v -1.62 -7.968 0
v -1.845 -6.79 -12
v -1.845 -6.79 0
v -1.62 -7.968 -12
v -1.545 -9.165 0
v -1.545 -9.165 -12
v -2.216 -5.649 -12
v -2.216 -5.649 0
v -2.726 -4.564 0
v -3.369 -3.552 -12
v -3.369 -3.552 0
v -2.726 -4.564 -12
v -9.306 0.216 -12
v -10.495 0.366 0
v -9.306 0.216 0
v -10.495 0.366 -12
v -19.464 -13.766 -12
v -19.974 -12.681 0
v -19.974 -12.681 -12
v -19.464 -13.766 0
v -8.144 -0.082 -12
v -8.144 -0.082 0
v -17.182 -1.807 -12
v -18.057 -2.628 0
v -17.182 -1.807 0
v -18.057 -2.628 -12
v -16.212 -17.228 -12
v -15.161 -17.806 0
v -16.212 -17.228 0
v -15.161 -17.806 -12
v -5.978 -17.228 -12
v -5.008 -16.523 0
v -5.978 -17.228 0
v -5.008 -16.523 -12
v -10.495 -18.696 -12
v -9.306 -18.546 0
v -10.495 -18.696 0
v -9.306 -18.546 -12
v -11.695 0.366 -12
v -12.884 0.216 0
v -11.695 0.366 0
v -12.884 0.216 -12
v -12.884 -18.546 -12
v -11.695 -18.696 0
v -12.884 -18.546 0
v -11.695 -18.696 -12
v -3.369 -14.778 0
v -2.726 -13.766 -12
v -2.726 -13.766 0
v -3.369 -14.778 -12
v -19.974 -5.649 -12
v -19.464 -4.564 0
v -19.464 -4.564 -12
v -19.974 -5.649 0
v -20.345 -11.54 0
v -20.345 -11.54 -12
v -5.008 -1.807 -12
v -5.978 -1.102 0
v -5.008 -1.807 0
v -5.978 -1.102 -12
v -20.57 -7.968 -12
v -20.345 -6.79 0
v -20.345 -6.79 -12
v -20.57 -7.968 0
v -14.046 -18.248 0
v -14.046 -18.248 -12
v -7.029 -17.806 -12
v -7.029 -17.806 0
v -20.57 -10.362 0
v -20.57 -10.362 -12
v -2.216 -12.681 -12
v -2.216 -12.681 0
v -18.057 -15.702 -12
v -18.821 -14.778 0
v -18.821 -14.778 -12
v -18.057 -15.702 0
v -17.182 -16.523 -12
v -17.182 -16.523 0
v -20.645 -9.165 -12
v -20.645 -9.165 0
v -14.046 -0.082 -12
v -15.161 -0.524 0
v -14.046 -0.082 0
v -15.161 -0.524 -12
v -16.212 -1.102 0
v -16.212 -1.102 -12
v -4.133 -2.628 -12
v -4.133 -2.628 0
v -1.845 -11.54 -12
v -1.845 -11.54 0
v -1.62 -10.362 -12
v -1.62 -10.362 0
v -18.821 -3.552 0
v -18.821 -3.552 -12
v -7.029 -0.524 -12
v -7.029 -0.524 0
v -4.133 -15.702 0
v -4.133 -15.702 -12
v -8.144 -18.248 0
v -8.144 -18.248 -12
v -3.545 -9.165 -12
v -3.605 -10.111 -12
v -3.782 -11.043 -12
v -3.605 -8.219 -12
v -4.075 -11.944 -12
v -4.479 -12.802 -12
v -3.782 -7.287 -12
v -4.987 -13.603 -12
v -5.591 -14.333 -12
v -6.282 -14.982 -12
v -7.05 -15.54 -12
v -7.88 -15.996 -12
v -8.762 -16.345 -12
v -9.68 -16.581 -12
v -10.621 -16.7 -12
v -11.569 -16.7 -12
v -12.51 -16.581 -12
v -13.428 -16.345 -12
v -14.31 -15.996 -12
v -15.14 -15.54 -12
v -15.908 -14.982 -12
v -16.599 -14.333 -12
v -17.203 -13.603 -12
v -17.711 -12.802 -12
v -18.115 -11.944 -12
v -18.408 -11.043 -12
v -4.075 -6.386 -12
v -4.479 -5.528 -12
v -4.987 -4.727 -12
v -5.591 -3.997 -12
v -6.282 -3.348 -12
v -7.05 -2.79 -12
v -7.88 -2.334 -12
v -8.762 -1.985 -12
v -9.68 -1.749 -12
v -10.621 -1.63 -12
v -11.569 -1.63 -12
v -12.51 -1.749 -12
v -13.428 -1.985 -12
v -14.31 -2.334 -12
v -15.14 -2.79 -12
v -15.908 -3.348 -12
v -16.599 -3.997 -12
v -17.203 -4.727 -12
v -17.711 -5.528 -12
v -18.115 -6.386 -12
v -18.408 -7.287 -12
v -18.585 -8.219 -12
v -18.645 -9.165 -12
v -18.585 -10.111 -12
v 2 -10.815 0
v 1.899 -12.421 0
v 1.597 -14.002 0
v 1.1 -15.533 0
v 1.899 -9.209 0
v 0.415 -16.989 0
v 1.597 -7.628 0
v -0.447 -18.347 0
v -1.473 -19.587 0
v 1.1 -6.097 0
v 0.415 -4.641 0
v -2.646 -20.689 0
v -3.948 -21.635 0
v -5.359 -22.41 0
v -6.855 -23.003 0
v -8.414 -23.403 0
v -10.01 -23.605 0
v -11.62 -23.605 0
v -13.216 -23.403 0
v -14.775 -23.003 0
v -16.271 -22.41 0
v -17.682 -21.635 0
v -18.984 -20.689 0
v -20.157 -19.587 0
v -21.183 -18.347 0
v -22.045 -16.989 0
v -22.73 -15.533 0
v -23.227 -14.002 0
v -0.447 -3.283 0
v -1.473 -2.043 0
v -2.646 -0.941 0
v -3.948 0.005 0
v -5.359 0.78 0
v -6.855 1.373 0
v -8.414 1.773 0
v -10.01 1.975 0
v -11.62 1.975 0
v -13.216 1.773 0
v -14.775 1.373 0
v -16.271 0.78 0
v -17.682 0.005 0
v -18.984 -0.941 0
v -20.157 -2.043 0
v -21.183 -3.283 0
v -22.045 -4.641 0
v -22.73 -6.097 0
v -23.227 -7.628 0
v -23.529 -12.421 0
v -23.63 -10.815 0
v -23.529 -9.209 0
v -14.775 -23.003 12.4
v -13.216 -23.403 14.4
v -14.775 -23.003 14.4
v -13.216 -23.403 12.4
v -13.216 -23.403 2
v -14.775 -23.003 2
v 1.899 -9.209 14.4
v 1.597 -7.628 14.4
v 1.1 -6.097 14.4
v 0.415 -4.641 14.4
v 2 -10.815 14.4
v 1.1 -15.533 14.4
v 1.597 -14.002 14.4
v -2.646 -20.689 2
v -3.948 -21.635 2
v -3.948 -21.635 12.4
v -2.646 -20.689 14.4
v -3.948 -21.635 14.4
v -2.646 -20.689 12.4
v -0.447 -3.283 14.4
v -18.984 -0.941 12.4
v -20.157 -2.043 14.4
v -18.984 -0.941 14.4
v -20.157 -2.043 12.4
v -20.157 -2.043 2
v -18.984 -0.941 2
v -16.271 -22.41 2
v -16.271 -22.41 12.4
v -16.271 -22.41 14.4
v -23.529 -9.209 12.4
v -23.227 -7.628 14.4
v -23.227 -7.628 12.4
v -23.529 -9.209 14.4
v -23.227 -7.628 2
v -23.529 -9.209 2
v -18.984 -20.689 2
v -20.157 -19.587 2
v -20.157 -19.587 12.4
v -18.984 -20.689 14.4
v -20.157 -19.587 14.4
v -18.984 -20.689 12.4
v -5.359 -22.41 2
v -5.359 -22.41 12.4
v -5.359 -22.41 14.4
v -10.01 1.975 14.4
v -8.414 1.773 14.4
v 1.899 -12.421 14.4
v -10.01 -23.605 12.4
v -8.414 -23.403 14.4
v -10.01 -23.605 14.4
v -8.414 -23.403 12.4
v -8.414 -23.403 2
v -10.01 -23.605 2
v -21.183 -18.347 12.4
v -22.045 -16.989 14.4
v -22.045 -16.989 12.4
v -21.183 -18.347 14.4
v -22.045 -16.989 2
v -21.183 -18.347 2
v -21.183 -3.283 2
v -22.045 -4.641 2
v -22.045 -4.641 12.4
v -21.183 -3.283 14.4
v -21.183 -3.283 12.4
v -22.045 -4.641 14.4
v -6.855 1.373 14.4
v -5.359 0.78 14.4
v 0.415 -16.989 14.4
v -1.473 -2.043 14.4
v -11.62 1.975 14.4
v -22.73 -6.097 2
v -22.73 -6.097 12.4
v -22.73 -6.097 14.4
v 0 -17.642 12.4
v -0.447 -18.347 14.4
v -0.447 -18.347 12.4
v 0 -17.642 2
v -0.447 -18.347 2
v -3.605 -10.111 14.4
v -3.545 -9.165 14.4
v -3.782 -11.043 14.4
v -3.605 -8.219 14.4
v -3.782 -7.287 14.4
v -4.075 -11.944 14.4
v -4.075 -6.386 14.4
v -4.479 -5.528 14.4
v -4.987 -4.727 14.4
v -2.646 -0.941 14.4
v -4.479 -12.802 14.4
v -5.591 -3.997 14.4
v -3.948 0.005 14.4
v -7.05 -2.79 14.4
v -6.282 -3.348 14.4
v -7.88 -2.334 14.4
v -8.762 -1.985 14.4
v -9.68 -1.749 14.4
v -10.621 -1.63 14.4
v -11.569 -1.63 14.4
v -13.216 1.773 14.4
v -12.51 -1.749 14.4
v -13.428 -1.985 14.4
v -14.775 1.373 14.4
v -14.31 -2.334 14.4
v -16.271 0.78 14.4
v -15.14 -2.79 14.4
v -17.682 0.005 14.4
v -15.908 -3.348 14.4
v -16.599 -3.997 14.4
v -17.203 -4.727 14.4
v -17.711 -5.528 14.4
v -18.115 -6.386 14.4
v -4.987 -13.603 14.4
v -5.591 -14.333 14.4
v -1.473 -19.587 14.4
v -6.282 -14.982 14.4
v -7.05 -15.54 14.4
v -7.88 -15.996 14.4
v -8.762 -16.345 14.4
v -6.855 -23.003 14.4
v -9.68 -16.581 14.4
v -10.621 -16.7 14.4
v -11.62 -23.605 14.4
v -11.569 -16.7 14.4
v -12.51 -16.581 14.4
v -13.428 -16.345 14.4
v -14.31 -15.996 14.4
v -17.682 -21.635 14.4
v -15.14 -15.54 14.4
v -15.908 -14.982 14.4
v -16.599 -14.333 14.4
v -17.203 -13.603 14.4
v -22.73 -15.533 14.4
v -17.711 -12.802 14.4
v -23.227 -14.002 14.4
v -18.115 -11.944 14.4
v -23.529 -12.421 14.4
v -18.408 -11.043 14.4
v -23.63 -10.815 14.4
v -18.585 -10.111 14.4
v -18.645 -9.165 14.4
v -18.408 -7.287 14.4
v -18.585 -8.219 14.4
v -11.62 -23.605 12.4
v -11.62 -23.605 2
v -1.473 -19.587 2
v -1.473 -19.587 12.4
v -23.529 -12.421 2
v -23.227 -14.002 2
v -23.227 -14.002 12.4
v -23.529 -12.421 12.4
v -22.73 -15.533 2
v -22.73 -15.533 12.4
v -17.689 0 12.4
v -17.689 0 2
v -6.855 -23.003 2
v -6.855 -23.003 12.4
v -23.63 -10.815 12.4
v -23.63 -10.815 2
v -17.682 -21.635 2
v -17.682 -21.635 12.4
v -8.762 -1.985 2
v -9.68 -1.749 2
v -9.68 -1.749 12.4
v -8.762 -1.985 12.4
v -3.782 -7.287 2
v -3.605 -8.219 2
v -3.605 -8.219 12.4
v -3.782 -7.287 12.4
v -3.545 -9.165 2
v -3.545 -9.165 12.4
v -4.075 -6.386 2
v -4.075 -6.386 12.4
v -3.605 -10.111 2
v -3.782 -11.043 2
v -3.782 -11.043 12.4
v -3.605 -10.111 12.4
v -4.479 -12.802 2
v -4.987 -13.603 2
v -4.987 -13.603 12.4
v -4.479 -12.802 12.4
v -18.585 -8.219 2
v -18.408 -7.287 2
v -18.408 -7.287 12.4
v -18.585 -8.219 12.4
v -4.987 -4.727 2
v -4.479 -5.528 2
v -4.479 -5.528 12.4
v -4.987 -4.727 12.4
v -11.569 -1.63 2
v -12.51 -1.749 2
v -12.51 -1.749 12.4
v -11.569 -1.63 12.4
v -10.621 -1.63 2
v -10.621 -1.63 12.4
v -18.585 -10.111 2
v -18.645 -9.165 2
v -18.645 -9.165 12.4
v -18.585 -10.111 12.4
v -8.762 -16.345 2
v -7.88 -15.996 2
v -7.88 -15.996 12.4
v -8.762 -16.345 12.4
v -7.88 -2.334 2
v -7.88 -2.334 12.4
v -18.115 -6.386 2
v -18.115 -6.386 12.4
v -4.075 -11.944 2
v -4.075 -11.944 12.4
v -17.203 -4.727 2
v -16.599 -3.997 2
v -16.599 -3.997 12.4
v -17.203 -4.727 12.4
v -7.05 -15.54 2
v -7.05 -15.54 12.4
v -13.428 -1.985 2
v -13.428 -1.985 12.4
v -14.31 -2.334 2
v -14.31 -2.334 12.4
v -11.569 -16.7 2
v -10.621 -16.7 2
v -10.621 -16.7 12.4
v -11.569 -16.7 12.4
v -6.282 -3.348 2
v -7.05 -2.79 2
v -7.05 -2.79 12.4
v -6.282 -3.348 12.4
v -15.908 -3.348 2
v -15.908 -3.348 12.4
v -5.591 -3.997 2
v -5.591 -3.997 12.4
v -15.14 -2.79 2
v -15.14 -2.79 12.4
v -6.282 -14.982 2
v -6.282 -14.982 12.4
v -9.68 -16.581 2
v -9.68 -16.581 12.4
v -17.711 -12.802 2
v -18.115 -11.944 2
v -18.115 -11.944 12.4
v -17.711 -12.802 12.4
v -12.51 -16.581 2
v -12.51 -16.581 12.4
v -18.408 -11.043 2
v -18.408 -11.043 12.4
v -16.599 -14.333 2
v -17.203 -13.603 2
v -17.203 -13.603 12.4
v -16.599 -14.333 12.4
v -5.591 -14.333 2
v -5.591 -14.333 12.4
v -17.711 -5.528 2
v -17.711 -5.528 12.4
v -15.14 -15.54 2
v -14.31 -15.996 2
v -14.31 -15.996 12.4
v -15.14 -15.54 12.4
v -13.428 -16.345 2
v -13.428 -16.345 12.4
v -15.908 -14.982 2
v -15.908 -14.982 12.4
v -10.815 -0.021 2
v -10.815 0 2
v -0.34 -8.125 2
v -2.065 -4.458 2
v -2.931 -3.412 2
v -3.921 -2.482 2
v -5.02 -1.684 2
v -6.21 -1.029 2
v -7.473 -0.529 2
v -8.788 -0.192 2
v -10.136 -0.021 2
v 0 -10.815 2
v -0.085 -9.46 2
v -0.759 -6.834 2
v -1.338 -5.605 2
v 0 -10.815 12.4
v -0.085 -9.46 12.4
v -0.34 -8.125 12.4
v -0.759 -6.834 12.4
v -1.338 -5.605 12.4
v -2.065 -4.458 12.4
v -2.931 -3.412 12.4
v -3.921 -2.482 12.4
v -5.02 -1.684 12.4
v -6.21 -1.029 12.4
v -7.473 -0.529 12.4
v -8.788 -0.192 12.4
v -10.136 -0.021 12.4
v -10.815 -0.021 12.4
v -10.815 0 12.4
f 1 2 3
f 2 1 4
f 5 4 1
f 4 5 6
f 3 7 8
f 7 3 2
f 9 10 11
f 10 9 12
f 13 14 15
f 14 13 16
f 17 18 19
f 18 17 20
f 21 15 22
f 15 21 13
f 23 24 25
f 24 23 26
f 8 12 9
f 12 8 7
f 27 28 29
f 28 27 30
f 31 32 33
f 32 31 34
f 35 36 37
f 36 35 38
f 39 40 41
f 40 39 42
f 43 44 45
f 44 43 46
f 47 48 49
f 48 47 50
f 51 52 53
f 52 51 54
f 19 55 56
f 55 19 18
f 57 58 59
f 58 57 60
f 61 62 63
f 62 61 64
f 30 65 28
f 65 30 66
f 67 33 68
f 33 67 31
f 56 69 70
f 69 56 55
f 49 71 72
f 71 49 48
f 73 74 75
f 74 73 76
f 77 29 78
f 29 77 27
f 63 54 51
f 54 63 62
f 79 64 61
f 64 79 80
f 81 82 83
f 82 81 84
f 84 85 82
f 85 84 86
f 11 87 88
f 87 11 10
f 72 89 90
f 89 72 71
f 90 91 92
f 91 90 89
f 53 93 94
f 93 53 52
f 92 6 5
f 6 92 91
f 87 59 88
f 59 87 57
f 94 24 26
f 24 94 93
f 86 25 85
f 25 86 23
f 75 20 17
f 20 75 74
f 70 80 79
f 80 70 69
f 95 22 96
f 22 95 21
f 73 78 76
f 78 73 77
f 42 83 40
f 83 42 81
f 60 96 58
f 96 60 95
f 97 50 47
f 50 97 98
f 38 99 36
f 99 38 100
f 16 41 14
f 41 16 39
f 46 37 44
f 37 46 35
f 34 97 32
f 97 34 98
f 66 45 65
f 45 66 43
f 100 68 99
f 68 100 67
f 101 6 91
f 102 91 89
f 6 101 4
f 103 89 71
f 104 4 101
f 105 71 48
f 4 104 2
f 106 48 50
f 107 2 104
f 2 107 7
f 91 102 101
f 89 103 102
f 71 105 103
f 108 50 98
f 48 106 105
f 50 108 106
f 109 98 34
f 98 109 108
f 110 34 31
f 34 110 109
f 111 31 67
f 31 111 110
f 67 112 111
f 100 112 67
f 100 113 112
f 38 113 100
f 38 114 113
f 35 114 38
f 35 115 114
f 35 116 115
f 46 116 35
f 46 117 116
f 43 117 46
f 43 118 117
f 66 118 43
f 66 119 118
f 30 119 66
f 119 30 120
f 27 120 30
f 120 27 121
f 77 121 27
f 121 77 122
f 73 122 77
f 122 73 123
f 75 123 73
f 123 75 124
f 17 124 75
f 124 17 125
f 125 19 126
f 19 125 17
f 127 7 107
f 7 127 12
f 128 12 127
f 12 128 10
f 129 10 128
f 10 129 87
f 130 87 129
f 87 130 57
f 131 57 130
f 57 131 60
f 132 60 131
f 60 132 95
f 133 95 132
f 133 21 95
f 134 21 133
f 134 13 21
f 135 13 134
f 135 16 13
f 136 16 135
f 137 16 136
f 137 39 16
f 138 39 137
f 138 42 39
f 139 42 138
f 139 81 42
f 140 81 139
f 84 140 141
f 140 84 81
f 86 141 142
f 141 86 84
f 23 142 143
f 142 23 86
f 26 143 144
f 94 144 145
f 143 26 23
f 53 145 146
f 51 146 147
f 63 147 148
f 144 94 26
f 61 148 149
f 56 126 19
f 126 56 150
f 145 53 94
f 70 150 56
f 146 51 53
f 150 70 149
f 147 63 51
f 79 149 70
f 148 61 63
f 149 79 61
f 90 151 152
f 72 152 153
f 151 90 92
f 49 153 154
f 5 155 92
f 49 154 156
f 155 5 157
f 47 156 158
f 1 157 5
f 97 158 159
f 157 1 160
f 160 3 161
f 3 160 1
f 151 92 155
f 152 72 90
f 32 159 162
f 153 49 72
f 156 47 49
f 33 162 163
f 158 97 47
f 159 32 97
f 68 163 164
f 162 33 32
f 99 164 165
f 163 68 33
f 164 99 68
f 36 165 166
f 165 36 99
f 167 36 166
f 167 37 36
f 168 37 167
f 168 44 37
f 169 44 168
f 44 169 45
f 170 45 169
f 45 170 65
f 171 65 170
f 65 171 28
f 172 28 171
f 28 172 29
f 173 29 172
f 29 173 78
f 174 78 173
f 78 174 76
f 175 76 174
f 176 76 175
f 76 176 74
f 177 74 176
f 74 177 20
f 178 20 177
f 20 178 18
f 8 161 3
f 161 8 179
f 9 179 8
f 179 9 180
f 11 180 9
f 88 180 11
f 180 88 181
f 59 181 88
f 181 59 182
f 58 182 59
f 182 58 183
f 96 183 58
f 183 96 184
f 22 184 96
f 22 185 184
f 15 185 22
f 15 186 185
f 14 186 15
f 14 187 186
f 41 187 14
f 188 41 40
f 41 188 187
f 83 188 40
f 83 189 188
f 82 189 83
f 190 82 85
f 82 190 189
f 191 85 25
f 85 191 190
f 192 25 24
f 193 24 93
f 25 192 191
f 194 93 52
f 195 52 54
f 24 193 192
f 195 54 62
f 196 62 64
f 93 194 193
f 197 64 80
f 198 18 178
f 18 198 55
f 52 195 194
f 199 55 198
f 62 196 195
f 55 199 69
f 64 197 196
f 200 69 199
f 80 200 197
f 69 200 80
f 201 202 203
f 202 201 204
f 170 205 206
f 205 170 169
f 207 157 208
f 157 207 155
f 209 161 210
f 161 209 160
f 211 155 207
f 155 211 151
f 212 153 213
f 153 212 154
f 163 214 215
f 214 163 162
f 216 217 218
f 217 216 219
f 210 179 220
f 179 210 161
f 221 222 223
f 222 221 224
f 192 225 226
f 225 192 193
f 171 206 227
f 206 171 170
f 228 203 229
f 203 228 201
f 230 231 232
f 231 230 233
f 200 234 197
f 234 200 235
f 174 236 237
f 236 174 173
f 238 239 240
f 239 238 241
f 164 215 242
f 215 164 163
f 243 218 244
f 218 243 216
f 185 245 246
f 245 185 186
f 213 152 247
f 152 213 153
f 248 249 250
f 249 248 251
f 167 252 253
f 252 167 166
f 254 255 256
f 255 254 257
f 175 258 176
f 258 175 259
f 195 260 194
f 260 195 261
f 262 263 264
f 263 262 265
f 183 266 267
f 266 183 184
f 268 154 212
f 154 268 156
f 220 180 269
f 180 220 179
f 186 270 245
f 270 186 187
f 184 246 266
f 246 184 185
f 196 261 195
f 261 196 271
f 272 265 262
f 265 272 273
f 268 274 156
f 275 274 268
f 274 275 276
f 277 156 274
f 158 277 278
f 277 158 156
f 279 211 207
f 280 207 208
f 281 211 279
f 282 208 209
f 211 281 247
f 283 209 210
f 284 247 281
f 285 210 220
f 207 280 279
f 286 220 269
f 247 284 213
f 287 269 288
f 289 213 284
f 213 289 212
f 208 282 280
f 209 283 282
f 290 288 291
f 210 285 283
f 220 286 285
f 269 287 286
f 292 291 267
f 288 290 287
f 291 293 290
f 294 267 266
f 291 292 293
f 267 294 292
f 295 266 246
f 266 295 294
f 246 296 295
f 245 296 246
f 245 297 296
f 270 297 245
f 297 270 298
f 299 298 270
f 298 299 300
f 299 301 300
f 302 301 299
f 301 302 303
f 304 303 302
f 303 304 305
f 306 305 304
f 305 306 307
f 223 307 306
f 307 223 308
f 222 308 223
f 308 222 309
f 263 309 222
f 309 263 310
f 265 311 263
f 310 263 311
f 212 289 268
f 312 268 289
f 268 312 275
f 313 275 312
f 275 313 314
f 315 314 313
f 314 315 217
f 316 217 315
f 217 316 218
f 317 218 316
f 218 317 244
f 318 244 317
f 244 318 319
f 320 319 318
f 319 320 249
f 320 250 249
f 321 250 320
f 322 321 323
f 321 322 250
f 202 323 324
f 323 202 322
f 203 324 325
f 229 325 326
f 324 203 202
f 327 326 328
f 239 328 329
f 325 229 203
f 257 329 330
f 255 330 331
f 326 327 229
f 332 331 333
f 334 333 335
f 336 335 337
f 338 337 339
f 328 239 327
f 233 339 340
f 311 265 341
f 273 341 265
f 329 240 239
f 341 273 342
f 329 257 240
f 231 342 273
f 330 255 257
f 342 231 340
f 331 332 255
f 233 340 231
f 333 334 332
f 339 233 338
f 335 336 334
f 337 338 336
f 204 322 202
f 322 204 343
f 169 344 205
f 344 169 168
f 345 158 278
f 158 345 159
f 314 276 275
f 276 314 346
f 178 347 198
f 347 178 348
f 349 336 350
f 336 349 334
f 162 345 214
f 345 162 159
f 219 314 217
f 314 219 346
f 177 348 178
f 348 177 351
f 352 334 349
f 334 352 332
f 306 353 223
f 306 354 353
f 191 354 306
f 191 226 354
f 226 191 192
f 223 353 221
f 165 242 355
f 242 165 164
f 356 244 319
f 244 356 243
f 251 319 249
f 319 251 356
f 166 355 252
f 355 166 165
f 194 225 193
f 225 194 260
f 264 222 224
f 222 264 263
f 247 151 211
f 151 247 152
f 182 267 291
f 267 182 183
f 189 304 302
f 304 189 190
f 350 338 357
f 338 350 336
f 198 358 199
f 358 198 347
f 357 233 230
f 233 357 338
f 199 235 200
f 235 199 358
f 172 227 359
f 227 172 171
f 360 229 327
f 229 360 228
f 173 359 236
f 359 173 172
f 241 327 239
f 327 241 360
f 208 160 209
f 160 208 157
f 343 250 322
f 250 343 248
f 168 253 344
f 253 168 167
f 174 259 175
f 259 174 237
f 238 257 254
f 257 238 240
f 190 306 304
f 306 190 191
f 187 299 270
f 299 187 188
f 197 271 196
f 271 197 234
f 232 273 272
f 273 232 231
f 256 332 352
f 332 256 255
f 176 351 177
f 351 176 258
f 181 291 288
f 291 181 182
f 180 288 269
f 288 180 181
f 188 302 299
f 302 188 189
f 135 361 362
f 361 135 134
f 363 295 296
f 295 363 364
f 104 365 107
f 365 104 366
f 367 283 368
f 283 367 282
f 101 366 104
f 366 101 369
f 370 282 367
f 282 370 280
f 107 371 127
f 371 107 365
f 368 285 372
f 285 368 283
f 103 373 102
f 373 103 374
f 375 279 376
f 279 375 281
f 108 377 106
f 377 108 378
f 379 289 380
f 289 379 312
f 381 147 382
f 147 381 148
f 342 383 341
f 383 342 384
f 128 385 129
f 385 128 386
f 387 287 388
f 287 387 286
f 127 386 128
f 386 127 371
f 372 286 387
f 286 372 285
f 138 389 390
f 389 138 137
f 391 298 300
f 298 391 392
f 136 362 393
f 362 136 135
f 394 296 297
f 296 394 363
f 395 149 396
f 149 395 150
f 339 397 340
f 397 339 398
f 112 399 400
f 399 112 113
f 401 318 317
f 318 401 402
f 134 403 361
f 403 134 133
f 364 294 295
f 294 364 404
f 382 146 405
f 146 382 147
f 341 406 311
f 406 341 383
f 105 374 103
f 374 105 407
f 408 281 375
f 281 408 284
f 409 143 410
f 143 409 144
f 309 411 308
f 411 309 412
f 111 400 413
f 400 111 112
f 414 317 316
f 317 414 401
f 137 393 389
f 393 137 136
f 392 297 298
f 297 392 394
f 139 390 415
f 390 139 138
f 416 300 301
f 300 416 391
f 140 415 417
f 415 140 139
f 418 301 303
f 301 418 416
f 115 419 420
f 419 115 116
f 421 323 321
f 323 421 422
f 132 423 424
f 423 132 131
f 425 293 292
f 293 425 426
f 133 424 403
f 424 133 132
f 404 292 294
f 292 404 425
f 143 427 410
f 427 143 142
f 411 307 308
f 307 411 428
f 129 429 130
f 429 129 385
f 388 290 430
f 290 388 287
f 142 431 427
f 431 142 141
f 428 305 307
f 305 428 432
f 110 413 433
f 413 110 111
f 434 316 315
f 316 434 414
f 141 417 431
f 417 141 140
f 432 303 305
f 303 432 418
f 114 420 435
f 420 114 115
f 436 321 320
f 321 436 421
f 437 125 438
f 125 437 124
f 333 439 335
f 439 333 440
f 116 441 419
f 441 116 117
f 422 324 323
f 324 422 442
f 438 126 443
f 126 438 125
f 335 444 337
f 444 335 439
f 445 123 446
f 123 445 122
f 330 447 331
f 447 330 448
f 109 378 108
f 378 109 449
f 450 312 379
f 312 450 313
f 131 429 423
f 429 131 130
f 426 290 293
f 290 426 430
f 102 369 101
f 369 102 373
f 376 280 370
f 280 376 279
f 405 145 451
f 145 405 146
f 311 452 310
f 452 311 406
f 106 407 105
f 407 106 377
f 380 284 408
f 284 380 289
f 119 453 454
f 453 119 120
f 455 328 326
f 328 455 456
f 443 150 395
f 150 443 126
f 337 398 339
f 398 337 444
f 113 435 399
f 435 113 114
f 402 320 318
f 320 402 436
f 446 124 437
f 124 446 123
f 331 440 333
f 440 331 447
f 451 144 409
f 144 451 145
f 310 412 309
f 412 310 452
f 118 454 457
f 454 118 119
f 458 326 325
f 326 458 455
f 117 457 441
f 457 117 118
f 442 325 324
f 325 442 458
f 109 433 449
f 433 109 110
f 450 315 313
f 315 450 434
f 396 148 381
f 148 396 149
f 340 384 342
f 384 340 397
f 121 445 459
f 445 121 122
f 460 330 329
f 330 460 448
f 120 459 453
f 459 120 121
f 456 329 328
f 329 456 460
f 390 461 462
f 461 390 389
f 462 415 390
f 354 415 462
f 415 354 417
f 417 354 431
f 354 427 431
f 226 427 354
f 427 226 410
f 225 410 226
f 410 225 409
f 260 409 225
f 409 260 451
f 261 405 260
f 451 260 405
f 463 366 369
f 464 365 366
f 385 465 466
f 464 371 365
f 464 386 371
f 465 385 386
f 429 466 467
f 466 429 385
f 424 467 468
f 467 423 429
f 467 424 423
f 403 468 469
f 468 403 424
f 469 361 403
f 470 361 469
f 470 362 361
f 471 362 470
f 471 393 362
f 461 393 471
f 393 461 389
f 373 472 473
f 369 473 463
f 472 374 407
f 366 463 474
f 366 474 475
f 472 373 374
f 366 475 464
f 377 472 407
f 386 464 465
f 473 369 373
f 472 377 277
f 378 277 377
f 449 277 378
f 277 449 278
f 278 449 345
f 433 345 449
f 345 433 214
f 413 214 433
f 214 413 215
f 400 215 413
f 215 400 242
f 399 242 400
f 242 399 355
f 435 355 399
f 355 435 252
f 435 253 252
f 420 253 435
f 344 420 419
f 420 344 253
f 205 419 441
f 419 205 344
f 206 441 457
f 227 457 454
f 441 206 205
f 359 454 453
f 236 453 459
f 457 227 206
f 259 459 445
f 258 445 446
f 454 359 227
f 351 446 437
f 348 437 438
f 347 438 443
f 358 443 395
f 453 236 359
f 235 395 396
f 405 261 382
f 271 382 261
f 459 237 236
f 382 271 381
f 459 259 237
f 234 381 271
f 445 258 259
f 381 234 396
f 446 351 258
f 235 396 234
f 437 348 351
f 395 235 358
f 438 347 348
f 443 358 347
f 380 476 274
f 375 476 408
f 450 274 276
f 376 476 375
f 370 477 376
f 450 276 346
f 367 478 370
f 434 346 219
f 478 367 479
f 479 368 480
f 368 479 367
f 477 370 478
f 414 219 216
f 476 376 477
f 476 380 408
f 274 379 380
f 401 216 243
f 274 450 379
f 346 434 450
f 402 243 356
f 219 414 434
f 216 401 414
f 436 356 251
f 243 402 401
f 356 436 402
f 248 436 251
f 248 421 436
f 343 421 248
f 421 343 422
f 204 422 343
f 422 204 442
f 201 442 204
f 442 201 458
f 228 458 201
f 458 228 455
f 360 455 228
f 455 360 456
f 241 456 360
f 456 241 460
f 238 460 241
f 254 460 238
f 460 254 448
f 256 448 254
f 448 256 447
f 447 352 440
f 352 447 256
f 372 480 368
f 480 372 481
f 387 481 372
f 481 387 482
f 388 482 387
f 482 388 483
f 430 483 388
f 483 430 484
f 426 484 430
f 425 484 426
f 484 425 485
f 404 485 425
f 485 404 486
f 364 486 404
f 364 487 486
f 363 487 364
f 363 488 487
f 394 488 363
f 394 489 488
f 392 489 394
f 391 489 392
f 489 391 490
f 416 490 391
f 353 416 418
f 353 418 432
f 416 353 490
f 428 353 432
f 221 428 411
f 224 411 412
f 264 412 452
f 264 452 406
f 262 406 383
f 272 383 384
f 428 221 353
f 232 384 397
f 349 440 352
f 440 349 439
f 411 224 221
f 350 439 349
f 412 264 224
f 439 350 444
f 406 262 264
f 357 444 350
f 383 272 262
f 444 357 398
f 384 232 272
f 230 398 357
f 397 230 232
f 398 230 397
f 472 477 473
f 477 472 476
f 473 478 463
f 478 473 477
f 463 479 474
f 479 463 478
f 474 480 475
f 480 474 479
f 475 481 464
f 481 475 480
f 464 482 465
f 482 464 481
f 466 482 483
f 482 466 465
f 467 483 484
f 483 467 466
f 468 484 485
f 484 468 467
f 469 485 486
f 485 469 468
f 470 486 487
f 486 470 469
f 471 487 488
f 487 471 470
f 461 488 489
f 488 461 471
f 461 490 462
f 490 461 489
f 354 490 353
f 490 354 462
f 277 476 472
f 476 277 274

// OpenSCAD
wall_thickness = 2;

// Length of the tube holder.
lens_tube_length = 12;

// Radius of tube holder.
lens_tube_r = 15.1 / 2;

// Measured height of phone case, including fudge factor for fit.
case_height = 10.4;

// Measured width of the case, used to determine case thickness.
case_width = 62.2;

// Extra distance in the X axis to offset lens center. Positive moves lens left in image.
lens_offset_fudge_x = 0;

// Extra dystance in the Y axis to offset lens center. Positive moves lens down in image.
lens_offset_fudge_y = 0;

// From dimensional drawings for iPhone 5. You shouldn't have to change these next three, but you can if you need to.
iphone_width = 58.57;
iphone_lens_center_offset_x = 9.28;
iphone_lens_center_offset_y = 7.35;

// Guessed at. No precise numbers available.
iphone_corner_radius = 9;

// [None]
// Calculated dimensions
case_wall_thickness = (case_width - iphone_width) / 2;
case_lens_center_offset_x = iphone_lens_center_offset_x + case_wall_thickness + lens_offset_fudge_x;
case_lens_center_offset_y = iphone_lens_center_offset_y + case_wall_thickness + lens_offset_fudge_y;
case_corner_radius = iphone_corner_radius + case_wall_thickness;
full_tube_height = case_height + 2*wall_thickness + lens_tube_length;

slop = .1;

module tube() {
  translate([-case_lens_center_offset_x, -case_lens_center_offset_y, -lens_tube_length])
  cylinder(h=lens_tube_length, r=lens_tube_r + wall_thickness, $fn=50);
}

module tube_cutout() {
  translate([-case_lens_center_offset_x, -case_lens_center_offset_y, -lens_tube_length - slop])
  cylinder(h=full_tube_height + 2*slop, r=lens_tube_r, $fn=50);
}


module holder() {
  translate([-case_corner_radius, -case_corner_radius])
  linear_extrude(height=2*wall_thickness + case_height)
  circle(case_corner_radius + wall_thickness, $fn=50);
}

module iphone_cutout() {
  translate([-case_corner_radius, -case_corner_radius, wall_thickness]) {
    linear_extrude(height=case_height) {
      circle(case_corner_radius, $fn=50);
      difference() {
        translate([-(50 - case_corner_radius), -(50 - case_corner_radius)]) square(50);
        square(case_corner_radius);
      }
    }
  }
}

difference() {
  union() {
    tube();
    holder();
  }
  tube_cutout();
  iphone_cutout();
}
